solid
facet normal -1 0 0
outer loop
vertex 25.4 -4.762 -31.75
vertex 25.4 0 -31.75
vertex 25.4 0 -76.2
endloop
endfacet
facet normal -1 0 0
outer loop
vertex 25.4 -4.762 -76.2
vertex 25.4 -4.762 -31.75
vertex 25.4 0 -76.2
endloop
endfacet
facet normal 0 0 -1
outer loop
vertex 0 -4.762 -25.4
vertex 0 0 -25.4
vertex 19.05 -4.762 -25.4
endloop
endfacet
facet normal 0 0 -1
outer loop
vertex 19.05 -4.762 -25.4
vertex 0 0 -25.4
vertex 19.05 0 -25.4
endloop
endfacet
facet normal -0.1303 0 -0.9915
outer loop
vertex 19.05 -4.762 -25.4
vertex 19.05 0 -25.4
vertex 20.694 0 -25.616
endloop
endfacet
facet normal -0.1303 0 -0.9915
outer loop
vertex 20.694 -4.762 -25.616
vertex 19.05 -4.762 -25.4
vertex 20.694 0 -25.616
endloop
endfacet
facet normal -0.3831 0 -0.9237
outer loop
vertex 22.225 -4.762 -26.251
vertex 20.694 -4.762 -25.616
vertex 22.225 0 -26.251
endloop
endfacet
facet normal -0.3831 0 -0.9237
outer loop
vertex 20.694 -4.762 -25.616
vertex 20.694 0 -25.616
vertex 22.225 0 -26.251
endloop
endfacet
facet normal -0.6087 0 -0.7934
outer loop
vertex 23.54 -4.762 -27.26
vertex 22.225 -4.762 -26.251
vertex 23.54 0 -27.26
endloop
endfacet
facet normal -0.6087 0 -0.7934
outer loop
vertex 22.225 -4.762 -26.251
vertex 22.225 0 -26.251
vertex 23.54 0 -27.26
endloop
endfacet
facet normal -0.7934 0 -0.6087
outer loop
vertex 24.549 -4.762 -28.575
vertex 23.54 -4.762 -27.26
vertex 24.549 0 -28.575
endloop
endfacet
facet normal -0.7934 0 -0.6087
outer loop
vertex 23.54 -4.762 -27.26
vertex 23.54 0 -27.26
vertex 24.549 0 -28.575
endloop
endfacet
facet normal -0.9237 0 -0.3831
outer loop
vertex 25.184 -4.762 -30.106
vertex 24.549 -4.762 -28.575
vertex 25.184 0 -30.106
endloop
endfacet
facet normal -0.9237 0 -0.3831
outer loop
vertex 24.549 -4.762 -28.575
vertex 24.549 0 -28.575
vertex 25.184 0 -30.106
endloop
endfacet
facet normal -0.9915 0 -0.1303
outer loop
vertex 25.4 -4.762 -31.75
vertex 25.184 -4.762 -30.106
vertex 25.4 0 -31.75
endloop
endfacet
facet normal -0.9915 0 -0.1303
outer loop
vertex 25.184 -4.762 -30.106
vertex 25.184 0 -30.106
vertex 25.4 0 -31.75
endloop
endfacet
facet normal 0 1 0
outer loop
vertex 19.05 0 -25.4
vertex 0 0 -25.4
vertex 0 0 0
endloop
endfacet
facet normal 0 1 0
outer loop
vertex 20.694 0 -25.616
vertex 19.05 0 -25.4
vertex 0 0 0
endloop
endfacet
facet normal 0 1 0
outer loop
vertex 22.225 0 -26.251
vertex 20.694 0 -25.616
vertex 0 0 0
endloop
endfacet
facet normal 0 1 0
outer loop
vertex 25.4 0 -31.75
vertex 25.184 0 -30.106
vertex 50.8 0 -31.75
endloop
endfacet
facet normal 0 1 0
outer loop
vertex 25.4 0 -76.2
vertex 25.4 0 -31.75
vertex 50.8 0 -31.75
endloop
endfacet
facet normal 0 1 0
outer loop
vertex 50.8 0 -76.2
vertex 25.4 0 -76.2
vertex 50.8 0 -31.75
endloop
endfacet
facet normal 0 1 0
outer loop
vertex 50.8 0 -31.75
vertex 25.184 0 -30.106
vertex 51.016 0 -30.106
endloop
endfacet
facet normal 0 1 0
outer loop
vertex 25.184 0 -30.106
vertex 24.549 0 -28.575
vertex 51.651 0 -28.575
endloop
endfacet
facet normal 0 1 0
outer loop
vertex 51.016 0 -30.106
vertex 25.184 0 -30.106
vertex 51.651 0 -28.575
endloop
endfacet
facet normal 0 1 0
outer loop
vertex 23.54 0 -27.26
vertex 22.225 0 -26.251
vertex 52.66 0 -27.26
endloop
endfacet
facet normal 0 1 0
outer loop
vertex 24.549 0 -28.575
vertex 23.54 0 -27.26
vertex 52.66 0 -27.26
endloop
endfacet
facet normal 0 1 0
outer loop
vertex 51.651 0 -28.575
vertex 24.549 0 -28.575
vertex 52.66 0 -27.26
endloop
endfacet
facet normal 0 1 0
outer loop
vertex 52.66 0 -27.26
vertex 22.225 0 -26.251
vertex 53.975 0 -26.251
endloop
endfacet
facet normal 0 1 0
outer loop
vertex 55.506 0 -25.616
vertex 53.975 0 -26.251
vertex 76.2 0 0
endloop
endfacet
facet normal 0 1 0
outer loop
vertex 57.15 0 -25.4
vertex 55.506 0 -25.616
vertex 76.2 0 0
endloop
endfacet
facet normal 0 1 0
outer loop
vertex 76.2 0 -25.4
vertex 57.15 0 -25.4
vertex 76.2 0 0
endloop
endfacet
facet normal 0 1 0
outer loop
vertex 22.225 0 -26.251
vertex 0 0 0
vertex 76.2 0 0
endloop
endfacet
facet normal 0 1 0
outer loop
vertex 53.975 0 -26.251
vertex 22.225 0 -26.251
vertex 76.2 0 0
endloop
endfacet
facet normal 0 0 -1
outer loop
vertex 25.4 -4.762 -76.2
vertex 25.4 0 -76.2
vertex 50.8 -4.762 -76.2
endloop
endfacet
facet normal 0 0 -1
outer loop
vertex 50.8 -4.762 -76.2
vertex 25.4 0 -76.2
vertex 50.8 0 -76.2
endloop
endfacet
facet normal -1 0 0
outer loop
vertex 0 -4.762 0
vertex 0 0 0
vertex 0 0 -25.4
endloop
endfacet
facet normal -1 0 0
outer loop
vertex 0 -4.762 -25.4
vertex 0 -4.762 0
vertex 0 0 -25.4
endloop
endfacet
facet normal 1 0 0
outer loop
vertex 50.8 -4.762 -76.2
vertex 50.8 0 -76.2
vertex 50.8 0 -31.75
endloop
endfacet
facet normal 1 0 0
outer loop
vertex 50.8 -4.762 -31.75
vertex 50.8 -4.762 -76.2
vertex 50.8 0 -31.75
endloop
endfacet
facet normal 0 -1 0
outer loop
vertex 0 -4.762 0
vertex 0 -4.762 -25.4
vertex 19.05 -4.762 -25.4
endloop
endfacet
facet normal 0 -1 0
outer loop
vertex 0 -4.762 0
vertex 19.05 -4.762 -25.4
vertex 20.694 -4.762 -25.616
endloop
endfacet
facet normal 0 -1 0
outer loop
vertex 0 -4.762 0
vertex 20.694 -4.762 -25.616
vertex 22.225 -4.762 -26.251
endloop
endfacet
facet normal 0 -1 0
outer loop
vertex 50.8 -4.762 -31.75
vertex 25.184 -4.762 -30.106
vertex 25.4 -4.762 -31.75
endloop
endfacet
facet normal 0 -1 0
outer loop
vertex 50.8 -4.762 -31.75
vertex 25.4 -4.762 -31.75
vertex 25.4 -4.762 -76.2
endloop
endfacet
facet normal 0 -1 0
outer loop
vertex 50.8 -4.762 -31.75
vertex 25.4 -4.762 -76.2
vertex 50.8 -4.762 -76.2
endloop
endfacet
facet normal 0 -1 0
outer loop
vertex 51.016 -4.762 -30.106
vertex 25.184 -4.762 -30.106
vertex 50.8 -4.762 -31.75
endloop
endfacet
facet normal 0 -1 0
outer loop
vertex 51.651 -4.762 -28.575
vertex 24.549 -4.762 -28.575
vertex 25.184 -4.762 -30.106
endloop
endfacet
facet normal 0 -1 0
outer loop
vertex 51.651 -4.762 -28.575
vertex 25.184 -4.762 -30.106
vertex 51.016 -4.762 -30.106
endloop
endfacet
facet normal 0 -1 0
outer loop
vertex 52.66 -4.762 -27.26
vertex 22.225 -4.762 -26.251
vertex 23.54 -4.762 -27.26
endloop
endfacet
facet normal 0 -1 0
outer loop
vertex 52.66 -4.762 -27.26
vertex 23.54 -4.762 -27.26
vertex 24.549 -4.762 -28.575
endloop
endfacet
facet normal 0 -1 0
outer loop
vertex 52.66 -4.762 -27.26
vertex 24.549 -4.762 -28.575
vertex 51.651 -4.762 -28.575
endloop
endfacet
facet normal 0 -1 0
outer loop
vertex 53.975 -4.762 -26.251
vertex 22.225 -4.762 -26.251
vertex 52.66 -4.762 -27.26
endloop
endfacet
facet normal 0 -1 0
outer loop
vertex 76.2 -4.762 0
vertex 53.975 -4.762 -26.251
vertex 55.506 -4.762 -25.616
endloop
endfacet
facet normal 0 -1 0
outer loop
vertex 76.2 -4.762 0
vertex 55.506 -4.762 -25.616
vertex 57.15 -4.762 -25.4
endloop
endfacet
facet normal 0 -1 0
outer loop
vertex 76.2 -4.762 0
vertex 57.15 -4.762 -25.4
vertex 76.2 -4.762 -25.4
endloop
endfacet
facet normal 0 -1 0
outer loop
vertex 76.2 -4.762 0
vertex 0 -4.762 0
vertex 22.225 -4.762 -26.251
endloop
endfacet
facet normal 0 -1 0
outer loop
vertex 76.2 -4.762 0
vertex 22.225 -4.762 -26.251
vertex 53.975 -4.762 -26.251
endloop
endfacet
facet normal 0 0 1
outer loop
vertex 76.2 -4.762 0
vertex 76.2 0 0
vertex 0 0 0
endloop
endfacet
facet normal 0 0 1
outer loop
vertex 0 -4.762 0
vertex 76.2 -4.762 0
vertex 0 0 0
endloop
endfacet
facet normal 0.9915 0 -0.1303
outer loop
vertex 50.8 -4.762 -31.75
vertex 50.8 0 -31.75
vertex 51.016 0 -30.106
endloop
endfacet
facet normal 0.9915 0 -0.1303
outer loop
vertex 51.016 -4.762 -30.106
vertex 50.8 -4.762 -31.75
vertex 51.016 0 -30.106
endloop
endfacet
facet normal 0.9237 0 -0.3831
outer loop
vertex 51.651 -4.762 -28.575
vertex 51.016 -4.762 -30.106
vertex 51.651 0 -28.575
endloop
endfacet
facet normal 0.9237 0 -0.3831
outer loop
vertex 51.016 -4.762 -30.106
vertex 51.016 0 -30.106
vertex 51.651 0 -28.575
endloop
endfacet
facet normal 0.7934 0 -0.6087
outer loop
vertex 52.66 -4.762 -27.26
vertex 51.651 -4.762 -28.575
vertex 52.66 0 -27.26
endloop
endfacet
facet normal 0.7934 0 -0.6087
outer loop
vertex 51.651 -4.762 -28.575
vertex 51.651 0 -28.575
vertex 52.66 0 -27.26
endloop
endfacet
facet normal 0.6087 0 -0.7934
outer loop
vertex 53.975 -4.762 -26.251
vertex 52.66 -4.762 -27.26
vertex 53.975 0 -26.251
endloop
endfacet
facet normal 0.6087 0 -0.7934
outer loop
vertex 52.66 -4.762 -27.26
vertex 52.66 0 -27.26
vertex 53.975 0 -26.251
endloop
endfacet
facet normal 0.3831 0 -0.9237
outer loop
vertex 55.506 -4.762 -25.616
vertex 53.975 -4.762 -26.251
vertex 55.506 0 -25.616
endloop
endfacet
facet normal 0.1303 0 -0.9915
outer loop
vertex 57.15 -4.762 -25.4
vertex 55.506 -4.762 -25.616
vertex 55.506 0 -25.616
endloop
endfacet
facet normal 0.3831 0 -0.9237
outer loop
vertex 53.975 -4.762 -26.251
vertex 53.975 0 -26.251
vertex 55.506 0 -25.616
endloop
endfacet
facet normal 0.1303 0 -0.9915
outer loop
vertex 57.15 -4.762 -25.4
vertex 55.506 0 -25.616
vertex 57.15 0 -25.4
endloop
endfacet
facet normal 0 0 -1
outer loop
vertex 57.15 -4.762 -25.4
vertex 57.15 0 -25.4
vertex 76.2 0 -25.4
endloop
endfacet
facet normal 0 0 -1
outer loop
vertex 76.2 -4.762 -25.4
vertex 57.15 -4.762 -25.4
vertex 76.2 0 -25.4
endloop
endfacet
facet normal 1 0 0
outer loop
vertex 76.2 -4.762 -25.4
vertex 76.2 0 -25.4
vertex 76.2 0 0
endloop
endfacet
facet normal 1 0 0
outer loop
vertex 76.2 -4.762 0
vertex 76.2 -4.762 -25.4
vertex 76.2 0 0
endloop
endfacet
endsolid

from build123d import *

# Parameters (mm, degrees)
F1_DEPTH = 4.7625


with BuildPart() as f1:
    # F0 (on Front) → F1 (new body)
    with BuildSketch(Plane.XZ):
        with BuildLine():
            Line((76.2, 0), (0, 0))
            Line((0, 0), (0, -25.4))
            Line((0, -25.4), (19.05, -25.4))
            ThreePointArc((19.05, -25.4), (23.540128, -27.259872), (25.4, -31.75))
            Line((25.4, -31.75), (25.4, -76.2))
            Line((25.4, -76.2), (50.8, -76.2))
            Line((50.8, -76.2), (50.8, -31.75))
            ThreePointArc((50.8, -31.75), (52.659872, -27.259872), (57.15, -25.4))
            Line((57.15, -25.4), (76.2, -25.4))
            Line((76.2, -25.4), (76.2, 0))
        make_face()
    extrude(amount=F1_DEPTH)


solid = f1.part
